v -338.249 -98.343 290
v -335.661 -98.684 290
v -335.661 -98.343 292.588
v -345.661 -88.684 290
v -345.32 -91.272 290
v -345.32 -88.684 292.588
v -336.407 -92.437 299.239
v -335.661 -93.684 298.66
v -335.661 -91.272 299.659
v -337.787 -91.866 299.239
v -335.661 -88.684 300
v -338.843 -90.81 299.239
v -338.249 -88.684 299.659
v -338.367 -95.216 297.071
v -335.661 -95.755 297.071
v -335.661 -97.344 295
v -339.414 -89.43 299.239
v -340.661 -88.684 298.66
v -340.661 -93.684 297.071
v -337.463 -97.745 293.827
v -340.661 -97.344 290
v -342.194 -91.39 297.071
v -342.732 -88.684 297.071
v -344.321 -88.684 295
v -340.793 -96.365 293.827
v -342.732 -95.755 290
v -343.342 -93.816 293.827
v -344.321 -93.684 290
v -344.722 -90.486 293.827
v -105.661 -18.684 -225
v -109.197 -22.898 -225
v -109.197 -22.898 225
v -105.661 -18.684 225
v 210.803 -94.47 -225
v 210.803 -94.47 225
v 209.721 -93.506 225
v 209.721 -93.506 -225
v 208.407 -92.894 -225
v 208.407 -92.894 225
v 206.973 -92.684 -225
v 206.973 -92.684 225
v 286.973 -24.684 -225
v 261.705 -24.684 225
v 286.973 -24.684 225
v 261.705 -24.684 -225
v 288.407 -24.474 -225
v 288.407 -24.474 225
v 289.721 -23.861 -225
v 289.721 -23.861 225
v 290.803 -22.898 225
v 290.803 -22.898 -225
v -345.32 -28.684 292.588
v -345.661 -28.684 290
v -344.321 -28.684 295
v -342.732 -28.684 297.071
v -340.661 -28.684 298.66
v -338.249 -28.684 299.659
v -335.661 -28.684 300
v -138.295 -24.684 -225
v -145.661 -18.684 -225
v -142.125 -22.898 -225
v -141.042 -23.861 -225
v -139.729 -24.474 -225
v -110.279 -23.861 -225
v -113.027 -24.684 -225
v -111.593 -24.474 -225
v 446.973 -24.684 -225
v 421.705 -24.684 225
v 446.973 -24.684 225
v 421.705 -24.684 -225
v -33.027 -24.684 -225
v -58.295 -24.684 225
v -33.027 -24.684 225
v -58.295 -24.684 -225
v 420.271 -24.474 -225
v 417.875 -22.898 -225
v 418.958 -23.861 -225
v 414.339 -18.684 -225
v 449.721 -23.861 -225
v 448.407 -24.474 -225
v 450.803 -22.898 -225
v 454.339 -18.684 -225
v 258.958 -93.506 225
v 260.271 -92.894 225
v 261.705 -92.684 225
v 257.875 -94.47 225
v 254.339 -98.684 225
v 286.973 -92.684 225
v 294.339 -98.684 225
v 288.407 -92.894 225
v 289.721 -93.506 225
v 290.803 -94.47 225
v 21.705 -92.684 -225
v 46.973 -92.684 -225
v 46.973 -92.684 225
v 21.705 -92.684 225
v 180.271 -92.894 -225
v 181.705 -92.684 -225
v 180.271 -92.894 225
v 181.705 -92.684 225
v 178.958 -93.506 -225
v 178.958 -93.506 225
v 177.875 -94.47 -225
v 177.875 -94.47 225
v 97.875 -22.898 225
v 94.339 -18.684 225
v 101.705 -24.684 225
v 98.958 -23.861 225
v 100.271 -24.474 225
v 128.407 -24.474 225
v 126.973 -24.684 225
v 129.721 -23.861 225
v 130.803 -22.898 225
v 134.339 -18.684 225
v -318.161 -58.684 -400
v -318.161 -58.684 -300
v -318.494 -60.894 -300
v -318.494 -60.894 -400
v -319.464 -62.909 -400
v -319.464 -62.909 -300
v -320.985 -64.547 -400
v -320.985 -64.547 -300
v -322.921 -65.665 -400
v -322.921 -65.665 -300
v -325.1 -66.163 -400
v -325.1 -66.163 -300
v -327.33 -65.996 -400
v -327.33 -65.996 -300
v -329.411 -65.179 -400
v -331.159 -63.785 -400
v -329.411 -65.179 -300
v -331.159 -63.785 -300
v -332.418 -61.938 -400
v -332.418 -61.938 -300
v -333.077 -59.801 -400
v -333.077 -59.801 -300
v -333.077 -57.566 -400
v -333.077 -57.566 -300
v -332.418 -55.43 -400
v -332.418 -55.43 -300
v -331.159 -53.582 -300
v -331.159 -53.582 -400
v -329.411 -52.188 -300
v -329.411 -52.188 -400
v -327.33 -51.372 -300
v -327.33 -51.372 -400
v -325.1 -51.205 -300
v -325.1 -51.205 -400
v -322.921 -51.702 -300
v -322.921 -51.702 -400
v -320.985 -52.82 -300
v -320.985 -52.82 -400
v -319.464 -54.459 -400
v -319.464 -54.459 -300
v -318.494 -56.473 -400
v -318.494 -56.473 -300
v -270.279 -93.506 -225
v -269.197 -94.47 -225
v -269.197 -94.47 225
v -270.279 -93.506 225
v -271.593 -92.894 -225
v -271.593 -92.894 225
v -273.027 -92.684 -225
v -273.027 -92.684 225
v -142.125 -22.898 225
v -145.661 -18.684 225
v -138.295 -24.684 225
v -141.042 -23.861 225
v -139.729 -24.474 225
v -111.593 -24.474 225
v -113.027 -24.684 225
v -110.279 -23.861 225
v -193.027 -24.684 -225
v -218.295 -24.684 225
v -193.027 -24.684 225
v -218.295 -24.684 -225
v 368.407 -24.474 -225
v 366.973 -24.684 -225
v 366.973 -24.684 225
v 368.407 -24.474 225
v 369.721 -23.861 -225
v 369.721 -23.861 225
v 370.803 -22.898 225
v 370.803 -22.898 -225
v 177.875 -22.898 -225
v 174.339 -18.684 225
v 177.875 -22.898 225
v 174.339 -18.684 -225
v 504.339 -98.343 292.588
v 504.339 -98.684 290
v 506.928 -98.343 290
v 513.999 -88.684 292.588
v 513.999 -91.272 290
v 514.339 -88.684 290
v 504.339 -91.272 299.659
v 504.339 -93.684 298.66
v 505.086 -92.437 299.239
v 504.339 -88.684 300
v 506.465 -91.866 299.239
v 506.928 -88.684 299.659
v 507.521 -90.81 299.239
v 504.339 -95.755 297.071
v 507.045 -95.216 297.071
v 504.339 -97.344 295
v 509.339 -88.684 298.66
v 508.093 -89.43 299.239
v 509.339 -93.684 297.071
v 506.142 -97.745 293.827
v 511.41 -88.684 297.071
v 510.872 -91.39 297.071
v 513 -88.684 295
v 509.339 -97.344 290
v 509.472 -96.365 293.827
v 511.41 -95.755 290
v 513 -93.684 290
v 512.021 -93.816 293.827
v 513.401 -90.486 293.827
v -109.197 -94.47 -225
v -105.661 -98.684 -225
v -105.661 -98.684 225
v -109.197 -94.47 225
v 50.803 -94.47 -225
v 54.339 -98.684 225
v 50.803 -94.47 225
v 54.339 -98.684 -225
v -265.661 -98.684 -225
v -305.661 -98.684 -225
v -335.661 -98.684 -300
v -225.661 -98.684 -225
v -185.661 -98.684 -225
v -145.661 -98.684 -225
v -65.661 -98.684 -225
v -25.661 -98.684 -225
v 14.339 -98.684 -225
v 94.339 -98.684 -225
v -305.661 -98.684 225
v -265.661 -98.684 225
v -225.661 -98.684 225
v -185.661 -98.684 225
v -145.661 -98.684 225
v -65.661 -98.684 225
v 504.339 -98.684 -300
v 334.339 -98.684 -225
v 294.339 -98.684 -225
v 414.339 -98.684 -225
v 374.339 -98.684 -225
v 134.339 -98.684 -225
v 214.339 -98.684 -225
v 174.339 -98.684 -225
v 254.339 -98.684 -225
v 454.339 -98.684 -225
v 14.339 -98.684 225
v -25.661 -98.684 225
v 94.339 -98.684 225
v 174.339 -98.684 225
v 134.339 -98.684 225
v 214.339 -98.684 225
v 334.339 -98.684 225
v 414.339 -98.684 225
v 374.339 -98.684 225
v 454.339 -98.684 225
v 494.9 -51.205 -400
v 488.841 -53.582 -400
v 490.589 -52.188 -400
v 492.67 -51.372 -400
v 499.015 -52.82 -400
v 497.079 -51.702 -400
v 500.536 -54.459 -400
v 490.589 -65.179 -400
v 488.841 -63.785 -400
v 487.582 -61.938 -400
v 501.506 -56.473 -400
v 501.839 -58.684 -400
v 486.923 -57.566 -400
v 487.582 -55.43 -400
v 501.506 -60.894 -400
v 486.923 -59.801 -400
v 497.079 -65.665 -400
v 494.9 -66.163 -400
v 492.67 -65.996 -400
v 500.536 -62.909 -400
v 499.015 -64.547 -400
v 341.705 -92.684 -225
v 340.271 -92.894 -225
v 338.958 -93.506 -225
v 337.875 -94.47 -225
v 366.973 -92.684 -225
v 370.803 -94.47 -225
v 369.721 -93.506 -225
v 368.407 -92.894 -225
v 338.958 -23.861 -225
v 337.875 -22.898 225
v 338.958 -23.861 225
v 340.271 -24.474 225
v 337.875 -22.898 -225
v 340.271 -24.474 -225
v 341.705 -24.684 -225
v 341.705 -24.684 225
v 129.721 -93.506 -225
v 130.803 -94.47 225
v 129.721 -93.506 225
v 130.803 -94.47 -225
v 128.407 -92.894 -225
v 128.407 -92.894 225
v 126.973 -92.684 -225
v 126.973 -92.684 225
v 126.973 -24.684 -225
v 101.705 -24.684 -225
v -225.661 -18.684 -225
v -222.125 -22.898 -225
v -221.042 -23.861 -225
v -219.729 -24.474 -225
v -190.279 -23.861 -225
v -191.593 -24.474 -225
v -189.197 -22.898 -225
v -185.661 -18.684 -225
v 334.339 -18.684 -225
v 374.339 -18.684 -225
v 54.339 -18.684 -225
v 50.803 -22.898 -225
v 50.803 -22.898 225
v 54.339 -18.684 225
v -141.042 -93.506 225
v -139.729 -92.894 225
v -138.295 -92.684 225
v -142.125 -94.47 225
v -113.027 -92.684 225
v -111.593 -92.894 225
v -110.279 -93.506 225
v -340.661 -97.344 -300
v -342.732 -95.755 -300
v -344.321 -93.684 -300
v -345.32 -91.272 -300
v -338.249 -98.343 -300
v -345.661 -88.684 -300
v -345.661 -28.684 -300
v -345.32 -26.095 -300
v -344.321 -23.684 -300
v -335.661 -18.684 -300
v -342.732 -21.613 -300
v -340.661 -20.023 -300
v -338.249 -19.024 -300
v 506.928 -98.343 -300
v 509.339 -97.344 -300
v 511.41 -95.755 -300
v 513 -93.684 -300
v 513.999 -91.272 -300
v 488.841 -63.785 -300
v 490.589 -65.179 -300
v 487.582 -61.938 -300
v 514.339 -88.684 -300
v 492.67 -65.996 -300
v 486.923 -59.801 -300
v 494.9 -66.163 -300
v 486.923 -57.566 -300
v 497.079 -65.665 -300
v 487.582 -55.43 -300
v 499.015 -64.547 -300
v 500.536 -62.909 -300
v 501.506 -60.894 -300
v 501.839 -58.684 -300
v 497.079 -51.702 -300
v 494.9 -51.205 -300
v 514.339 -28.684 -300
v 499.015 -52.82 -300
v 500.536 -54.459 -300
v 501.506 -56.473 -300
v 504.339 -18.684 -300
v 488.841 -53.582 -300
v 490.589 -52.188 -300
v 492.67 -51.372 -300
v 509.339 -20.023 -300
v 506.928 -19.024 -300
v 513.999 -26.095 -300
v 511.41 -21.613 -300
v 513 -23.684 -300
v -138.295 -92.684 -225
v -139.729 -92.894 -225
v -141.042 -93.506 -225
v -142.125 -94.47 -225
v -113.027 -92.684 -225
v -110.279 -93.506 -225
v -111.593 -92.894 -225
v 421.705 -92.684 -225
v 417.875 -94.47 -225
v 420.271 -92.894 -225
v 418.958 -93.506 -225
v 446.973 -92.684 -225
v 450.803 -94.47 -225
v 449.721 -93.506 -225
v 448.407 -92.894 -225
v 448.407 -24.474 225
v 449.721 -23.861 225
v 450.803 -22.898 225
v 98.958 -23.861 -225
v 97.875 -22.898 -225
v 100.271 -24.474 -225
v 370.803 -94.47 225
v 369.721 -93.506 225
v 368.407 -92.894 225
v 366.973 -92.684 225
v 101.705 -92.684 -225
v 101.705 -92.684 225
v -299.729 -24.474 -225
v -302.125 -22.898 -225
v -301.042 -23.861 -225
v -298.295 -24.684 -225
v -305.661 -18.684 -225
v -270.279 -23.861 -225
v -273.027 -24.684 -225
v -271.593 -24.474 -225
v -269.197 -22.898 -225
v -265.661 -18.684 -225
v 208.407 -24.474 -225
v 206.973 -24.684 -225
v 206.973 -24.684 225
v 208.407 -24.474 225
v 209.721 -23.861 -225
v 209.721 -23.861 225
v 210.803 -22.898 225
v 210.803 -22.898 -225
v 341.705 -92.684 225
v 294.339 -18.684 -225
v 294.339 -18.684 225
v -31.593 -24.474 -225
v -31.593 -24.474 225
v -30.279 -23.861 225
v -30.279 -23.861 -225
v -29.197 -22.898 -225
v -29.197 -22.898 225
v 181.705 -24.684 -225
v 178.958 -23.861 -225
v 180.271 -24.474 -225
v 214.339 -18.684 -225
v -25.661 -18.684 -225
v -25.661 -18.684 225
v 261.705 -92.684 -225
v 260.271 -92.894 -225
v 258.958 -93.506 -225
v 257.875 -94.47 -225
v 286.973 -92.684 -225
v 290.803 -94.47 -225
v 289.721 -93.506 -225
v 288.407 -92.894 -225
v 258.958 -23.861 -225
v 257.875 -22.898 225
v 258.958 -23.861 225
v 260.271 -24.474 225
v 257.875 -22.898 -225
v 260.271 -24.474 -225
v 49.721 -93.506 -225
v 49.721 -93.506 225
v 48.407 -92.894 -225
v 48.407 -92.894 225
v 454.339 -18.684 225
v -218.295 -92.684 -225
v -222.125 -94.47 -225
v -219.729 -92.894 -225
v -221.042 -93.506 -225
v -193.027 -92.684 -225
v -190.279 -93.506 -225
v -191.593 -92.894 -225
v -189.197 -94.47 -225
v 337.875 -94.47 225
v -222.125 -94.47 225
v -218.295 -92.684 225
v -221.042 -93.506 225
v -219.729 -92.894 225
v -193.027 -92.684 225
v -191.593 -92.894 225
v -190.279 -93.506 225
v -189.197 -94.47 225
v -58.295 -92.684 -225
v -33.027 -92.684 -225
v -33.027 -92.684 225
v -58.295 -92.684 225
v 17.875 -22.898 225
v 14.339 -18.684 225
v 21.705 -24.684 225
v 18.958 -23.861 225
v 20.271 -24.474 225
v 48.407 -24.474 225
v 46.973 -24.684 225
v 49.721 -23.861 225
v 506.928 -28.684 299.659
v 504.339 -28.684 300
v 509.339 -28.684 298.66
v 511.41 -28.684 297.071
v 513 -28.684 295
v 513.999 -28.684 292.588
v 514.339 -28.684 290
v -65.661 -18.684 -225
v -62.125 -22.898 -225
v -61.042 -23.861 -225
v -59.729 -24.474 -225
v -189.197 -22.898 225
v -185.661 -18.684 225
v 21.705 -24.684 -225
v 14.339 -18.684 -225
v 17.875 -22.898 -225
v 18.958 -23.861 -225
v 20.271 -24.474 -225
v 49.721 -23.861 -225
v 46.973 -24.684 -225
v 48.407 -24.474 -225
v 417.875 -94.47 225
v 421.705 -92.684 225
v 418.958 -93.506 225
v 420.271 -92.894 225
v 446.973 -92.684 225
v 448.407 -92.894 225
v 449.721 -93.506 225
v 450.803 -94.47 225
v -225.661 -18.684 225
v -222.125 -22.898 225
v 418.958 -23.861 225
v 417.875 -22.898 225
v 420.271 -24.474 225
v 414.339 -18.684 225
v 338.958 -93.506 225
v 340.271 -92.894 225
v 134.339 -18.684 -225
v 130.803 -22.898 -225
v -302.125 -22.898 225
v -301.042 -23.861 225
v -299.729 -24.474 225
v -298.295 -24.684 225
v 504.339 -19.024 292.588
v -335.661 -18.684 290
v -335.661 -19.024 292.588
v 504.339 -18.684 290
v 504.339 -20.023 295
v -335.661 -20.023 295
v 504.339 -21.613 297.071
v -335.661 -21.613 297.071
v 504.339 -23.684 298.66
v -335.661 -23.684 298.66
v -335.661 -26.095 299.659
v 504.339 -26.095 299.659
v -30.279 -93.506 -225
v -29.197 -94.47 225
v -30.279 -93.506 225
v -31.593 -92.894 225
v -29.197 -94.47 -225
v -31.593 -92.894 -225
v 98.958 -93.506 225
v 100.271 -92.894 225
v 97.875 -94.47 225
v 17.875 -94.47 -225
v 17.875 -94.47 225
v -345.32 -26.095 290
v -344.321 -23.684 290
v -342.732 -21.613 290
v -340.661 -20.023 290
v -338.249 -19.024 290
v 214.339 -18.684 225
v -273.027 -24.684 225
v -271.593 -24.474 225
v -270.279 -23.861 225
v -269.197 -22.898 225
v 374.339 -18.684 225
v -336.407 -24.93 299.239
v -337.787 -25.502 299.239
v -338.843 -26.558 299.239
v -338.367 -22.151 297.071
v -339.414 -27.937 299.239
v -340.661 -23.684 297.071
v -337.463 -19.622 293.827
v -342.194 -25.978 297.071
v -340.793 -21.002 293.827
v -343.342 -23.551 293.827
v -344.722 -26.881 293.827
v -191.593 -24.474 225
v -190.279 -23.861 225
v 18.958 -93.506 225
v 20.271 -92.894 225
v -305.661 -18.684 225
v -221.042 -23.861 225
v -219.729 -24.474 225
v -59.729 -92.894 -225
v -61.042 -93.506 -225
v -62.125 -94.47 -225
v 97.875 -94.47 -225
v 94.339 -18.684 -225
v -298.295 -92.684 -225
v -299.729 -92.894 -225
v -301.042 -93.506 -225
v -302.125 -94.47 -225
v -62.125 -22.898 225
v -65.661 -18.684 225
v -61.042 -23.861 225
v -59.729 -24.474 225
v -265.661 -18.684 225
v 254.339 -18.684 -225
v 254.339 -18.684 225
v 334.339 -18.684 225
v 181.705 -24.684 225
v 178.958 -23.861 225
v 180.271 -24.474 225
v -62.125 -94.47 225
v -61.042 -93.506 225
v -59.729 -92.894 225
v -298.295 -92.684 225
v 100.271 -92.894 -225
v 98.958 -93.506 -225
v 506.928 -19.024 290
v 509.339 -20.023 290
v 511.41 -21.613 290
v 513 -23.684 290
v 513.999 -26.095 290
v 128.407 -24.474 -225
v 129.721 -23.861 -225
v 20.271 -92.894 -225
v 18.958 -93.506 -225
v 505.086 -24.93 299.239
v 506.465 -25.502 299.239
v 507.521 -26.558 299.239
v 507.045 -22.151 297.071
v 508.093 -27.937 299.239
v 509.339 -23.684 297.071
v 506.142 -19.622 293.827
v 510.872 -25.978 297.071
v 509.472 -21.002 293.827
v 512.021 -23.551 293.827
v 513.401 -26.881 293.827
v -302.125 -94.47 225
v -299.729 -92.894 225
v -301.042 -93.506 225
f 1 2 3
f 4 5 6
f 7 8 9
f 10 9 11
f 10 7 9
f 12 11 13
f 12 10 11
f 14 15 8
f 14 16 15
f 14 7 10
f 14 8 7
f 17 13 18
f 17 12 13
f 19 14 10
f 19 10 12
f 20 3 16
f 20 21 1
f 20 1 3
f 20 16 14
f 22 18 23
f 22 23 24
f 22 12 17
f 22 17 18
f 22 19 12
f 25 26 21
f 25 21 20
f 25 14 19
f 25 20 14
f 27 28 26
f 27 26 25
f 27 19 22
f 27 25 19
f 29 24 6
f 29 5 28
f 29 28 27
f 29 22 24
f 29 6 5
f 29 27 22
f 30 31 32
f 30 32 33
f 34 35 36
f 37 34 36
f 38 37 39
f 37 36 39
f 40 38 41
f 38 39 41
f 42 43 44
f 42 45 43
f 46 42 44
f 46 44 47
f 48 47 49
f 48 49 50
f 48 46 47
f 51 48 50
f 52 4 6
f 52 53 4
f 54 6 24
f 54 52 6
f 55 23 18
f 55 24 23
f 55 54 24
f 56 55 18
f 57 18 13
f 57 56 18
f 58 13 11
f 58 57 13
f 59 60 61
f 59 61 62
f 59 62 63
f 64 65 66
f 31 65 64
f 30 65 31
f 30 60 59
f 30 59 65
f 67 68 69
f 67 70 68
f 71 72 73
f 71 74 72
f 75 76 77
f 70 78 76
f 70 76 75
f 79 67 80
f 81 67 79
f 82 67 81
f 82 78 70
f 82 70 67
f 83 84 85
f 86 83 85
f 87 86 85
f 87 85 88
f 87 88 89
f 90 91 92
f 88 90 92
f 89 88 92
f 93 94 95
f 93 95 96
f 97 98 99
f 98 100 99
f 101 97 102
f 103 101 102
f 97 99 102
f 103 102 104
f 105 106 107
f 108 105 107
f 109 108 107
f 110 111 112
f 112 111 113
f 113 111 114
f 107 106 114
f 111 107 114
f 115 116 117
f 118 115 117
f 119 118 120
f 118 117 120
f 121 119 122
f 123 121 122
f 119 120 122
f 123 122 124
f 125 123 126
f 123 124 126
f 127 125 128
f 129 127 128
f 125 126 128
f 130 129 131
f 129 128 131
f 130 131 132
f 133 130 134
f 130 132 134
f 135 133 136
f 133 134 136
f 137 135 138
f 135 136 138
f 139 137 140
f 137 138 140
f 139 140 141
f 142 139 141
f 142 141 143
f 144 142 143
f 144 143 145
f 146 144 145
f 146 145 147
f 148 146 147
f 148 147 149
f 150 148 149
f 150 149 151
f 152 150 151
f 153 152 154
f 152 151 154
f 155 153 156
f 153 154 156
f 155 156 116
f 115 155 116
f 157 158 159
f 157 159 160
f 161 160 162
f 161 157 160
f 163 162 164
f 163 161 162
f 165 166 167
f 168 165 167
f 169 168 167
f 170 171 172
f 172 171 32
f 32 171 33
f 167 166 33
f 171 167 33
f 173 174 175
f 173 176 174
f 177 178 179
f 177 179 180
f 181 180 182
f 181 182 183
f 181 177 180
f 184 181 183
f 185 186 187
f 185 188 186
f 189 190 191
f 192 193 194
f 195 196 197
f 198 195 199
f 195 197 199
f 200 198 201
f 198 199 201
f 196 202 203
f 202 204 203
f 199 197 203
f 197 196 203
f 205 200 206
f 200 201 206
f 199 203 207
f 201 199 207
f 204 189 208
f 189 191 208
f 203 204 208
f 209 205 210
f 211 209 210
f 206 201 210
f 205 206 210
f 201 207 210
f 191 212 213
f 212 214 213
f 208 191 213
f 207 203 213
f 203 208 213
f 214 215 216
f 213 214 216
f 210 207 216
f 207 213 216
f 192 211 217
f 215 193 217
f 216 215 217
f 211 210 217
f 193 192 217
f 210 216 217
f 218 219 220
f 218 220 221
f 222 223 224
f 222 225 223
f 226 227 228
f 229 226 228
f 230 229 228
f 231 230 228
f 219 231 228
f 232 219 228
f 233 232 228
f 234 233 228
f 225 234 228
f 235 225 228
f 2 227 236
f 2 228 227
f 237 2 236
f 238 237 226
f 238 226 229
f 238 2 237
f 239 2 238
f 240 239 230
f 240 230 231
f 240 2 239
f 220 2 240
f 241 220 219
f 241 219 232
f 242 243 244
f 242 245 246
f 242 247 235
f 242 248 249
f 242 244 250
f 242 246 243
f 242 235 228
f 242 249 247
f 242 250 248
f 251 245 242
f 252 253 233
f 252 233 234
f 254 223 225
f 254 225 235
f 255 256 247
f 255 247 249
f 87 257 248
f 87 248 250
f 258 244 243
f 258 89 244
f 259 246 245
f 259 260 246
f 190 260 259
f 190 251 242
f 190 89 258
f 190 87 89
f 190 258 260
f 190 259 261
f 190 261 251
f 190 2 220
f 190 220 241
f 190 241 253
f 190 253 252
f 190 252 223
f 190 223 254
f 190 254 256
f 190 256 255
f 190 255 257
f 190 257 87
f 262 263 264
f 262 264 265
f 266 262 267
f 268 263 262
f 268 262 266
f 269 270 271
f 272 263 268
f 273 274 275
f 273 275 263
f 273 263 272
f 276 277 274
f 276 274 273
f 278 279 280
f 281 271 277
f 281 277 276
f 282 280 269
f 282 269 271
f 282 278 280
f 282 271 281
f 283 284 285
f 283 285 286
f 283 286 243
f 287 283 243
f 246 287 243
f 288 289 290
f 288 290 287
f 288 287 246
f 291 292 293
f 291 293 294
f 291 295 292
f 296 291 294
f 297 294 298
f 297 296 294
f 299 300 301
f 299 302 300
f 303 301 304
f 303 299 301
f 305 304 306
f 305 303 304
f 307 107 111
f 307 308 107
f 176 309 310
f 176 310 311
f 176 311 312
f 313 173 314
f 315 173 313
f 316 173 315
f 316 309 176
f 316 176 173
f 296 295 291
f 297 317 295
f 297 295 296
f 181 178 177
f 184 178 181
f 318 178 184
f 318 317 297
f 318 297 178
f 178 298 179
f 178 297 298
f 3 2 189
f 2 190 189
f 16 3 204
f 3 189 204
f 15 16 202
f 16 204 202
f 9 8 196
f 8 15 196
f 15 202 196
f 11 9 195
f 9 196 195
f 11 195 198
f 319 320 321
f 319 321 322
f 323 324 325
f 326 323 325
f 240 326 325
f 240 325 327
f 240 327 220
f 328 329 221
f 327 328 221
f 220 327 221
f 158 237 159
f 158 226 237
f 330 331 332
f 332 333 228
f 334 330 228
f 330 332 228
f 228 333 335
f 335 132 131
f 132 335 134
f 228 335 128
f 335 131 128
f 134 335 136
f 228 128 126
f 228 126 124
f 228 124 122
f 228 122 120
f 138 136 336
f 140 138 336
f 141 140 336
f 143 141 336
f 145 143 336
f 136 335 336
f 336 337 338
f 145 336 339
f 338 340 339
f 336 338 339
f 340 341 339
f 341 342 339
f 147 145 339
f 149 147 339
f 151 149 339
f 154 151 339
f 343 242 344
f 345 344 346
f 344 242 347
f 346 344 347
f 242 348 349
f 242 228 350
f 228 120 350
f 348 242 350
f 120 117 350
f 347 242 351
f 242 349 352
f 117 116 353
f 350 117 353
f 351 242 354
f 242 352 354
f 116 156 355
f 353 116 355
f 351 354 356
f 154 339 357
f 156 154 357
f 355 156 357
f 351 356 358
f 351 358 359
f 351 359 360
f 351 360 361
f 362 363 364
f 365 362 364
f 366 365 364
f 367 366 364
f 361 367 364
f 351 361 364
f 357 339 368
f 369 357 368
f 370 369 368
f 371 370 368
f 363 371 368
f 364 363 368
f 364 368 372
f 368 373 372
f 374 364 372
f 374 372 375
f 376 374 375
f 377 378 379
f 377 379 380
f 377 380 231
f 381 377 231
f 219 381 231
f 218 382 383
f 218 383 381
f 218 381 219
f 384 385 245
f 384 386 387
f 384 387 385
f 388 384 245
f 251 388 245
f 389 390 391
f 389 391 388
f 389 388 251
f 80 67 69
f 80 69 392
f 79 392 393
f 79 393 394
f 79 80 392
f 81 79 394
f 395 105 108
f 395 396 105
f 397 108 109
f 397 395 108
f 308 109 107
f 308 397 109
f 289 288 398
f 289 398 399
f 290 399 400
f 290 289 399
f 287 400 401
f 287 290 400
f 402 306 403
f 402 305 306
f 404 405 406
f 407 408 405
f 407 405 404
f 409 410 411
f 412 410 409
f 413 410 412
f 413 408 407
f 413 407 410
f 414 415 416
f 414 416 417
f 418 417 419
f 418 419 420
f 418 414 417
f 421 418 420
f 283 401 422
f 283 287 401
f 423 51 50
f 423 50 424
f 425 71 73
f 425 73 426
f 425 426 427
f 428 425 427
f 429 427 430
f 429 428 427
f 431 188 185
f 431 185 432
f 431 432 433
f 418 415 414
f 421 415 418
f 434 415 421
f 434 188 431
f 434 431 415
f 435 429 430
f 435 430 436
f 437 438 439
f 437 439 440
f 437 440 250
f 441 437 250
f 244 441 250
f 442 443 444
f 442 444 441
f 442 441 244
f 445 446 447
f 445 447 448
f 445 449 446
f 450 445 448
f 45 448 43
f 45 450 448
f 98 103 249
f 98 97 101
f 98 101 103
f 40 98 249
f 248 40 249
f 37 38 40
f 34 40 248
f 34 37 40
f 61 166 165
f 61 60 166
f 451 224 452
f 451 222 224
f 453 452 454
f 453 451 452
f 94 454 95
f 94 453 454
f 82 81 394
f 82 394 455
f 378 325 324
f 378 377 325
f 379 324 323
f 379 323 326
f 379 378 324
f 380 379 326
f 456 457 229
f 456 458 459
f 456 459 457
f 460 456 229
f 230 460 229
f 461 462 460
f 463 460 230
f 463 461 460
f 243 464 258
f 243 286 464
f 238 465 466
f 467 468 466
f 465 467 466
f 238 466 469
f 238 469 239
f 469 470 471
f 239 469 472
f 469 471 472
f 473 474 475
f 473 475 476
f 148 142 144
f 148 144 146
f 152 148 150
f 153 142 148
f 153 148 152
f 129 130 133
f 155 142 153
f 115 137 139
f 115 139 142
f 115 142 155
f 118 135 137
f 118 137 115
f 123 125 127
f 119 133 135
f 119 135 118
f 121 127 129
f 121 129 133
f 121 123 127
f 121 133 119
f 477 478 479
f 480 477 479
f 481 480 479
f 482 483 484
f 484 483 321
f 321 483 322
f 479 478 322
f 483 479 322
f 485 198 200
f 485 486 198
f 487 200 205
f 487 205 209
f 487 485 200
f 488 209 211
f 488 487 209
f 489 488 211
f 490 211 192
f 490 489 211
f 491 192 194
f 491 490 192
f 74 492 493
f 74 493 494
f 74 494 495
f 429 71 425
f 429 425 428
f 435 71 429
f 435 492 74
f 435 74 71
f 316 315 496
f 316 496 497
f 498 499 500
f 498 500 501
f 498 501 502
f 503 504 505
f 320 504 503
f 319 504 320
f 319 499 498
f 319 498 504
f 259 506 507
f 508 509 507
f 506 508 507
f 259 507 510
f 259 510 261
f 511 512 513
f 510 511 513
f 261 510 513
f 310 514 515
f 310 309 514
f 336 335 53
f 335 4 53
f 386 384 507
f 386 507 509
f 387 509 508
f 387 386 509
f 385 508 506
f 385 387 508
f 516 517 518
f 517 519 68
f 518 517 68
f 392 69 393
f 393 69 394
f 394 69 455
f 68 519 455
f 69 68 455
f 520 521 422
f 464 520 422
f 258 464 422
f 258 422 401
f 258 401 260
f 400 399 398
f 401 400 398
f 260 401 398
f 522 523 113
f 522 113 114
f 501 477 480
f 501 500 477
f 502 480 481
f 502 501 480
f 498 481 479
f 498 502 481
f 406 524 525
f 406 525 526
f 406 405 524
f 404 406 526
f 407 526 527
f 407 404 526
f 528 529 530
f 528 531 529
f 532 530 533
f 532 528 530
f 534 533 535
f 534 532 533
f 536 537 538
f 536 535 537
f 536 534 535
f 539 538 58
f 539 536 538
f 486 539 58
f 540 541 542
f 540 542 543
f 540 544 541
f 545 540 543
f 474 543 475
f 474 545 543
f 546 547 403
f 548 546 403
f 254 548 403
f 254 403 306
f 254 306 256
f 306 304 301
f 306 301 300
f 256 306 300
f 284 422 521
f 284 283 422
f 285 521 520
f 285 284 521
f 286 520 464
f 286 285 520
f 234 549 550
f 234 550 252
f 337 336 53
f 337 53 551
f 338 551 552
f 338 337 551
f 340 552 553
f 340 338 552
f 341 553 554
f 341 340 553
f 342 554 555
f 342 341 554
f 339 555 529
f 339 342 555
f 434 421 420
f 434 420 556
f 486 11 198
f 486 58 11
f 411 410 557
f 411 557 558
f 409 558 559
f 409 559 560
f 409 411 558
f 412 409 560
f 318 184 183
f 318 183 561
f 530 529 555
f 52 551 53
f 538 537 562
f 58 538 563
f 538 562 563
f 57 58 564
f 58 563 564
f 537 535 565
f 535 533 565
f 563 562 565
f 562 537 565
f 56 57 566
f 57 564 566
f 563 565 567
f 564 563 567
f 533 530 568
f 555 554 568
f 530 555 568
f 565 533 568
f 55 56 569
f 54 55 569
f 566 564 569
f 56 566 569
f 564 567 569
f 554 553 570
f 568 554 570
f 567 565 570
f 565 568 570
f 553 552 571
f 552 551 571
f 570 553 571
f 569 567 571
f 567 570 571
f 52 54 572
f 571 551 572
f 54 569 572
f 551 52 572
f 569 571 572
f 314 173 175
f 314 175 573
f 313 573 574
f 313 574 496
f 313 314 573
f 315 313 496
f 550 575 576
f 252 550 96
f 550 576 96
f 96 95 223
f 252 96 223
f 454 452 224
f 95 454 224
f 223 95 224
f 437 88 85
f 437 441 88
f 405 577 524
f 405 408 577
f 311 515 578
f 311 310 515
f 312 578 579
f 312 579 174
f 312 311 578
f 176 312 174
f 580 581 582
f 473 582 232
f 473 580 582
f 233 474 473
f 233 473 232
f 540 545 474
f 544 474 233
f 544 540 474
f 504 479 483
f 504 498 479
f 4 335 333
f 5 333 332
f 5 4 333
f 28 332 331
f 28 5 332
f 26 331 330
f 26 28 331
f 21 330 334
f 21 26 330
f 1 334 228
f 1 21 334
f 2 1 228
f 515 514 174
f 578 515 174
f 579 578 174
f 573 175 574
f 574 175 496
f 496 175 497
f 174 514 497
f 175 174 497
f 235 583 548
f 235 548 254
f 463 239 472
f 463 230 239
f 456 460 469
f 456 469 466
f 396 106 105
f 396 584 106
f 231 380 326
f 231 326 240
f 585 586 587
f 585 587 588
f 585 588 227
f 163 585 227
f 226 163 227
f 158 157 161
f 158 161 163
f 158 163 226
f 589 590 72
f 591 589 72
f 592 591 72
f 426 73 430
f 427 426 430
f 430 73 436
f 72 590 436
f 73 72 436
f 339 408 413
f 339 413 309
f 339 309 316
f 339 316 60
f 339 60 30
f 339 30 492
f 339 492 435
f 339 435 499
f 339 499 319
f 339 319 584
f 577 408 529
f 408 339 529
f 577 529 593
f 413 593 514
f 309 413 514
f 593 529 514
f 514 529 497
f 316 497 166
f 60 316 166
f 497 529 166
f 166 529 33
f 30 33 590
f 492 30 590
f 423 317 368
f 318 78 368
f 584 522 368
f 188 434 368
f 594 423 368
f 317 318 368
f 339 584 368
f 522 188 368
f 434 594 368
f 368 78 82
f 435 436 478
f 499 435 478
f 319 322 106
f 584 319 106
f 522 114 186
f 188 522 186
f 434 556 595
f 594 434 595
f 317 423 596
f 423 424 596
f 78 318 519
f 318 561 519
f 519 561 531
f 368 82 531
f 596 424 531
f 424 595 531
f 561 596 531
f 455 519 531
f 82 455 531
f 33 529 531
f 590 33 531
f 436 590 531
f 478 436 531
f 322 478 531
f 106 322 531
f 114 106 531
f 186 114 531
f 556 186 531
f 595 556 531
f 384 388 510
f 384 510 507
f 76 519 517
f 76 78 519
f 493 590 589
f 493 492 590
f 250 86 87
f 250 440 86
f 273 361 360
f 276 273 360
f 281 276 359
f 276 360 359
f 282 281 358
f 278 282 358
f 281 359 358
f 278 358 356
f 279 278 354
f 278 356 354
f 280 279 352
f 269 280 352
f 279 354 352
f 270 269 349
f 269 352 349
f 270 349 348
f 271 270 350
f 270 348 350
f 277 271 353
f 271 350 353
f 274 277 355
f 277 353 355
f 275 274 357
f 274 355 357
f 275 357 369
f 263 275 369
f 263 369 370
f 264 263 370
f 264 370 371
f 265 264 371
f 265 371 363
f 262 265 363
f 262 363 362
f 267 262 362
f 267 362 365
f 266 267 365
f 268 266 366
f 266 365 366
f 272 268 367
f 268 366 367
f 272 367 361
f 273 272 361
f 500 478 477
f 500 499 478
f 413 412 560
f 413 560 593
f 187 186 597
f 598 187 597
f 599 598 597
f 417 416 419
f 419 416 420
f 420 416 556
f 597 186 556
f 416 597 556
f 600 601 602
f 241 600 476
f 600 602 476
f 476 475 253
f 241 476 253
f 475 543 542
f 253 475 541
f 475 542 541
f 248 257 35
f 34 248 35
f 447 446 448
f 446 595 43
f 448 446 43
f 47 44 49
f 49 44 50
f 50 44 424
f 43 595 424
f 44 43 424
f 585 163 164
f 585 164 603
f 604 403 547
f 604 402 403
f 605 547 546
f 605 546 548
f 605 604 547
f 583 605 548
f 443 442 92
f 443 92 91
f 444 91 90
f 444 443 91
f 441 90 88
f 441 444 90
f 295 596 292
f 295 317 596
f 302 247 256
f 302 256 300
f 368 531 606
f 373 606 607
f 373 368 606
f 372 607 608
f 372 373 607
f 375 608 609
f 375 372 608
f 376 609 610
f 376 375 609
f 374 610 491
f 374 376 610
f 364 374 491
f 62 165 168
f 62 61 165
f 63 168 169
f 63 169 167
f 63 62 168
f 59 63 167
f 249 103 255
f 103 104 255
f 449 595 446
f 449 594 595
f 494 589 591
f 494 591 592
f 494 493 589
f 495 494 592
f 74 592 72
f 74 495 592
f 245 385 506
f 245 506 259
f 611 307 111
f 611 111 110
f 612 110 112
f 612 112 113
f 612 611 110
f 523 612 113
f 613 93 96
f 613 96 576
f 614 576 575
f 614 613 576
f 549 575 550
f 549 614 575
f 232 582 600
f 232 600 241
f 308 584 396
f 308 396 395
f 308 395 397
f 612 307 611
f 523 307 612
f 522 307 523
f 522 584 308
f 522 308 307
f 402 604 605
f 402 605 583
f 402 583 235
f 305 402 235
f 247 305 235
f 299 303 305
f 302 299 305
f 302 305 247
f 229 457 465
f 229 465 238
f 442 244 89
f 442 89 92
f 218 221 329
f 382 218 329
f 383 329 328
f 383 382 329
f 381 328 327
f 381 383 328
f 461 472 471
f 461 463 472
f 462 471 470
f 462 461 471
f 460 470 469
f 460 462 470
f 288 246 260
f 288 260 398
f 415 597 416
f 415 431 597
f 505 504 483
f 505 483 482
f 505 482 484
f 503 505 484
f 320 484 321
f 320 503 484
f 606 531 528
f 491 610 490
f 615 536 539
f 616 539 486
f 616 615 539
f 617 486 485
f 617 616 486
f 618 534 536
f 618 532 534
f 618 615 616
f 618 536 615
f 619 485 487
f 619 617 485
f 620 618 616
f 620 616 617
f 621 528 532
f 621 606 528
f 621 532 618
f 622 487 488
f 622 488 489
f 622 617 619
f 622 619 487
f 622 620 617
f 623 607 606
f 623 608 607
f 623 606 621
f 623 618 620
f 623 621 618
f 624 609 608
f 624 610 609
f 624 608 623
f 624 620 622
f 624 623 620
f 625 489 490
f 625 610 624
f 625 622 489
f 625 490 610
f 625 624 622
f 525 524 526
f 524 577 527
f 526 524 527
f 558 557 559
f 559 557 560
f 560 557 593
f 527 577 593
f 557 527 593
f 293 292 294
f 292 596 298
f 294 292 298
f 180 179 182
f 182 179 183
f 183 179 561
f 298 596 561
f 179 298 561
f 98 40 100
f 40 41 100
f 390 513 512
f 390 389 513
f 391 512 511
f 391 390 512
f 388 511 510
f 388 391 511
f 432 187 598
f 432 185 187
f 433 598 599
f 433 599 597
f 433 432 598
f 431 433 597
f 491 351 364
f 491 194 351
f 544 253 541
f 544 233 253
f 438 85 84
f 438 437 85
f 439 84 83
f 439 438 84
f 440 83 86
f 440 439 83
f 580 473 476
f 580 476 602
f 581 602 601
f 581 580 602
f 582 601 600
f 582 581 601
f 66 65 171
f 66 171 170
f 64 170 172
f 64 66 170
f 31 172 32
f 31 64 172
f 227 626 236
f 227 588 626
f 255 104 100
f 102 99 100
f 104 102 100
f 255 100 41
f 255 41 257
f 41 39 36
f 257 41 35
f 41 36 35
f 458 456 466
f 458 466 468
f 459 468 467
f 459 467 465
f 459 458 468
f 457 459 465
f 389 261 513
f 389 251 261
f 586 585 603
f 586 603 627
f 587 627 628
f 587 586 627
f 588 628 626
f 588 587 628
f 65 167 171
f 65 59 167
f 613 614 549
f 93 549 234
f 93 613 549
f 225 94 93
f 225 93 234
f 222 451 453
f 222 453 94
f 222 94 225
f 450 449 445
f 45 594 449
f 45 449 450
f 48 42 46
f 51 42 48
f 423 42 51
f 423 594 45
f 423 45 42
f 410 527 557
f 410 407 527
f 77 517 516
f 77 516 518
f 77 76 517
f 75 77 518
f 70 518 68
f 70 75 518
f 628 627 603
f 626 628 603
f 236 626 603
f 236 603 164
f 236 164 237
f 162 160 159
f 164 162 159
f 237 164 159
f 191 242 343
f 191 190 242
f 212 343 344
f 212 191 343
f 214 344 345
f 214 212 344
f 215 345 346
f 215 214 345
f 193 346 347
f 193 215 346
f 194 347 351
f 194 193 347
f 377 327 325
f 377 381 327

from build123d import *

# Parameters (mm, degrees)
F0_W     = 860
F0_H     = 80
F1_DEPTH = 300
F2_R     = 7.5
F3_DEPTH = 100
F5_DEPTH = 225
F6_R     = 10


with BuildPart() as f1:
    # F0 (on Top) → F1 (new body, symmetric)
    with BuildSketch(Plane.XY):
        with Locations((84.33931, -58.683639)):
            Rectangle(F0_W, F0_H)
    extrude(amount=F1_DEPTH, both=True)

    # F2 (on face) → F3 (join)
    with BuildSketch(Plane(origin=(0, 0, -300), x_dir=(1, 0, 0), z_dir=(0, 0, -1))):
        with Locations((494.33931, 58.683639)):
            Circle(F2_R)
        with Locations((-325.66069, 58.683639)):
            Circle(F2_R)
    extrude(amount=F3_DEPTH)

    # F4 (on Top) → F5 (cut, symmetric)
    with BuildSketch(Plane.XY):
        with BuildLine():
            Line((-265.66069, -18.683639), (-305.66069, -18.683639))
            Line((-305.66069, -18.683639), (-302.124776, -22.897577))
            ThreePointArc((-302.124776, -22.897577), (-300.407645, -24.215178), (-298.294554, -24.683639))
            Line((-298.294554, -24.683639), (-273.026826, -24.683639))
            ThreePointArc((-273.026826, -24.683639), (-270.913735, -24.215178), (-269.196604, -22.897577))
            Line((-269.196604, -22.897577), (-265.66069, -18.683639))
        make_face()
        with BuildLine():
            Line((-185.66069, -18.683639), (-225.66069, -18.683639))
            Line((-225.66069, -18.683639), (-222.124776, -22.897577))
            ThreePointArc((-222.124776, -22.897577), (-220.407645, -24.215178), (-218.294554, -24.683639))
            Line((-218.294554, -24.683639), (-193.026826, -24.683639))
            ThreePointArc((-193.026826, -24.683639), (-190.913735, -24.215178), (-189.196604, -22.897577))
            Line((-189.196604, -22.897577), (-185.66069, -18.683639))
        make_face()
        with BuildLine():
            Line((-105.66069, -18.683639), (-145.66069, -18.683639))
            Line((-145.66069, -18.683639), (-142.124776, -22.897577))
            ThreePointArc((-142.124776, -22.897577), (-140.407645, -24.215178), (-138.294554, -24.683639))
            Line((-138.294554, -24.683639), (-113.026826, -24.683639))
            ThreePointArc((-113.026826, -24.683639), (-110.913735, -24.215178), (-109.196604, -22.897577))
            Line((-109.196604, -22.897577), (-105.66069, -18.683639))
        make_face()
        with BuildLine():
            Line((-25.66069, -18.683639), (-65.66069, -18.683639))
            Line((-65.66069, -18.683639), (-62.124776, -22.897577))
            ThreePointArc((-62.124776, -22.897577), (-60.407645, -24.215178), (-58.294554, -24.683639))
            Line((-58.294554, -24.683639), (-33.026826, -24.683639))
            ThreePointArc((-33.026826, -24.683639), (-30.913735, -24.215178), (-29.196604, -22.897577))
            Line((-29.196604, -22.897577), (-25.66069, -18.683639))
        make_face()
        with BuildLine():
            Line((54.33931, -18.683639), (14.33931, -18.683639))
            Line((14.33931, -18.683639), (17.875224, -22.897577))
            ThreePointArc((17.875224, -22.897577), (19.592355, -24.215178), (21.705446, -24.683639))
            Line((21.705446, -24.683639), (46.973174, -24.683639))
            ThreePointArc((46.973174, -24.683639), (49.086265, -24.215178), (50.803396, -22.897577))
            Line((50.803396, -22.897577), (54.33931, -18.683639))
        make_face()
        with BuildLine():
            Line((134.33931, -18.683639), (94.33931, -18.683639))
            Line((94.33931, -18.683639), (97.875224, -22.897577))
            ThreePointArc((97.875224, -22.897577), (99.592355, -24.215178), (101.705446, -24.683639))
            Line((101.705446, -24.683639), (126.973174, -24.683639))
            ThreePointArc((126.973174, -24.683639), (129.086265, -24.215178), (130.803396, -22.897577))
            Line((130.803396, -22.897577), (134.33931, -18.683639))
        make_face()
        with BuildLine():
            Line((214.33931, -18.683639), (174.33931, -18.683639))
            Line((174.33931, -18.683639), (177.875224, -22.897577))
            ThreePointArc((177.875224, -22.897577), (179.592355, -24.215178), (181.705446, -24.683639))
            Line((181.705446, -24.683639), (206.973174, -24.683639))
            ThreePointArc((206.973174, -24.683639), (209.086265, -24.215178), (210.803396, -22.897577))
            Line((210.803396, -22.897577), (214.33931, -18.683639))
        make_face()
        with BuildLine():
            Line((294.33931, -18.683639), (254.33931, -18.683639))
            Line((254.33931, -18.683639), (257.875224, -22.897577))
            ThreePointArc((257.875224, -22.897577), (259.592355, -24.215178), (261.705446, -24.683639))
            Line((261.705446, -24.683639), (286.973174, -24.683639))
            ThreePointArc((286.973174, -24.683639), (289.086265, -24.215178), (290.803396, -22.897577))
            Line((290.803396, -22.897577), (294.33931, -18.683639))
        make_face()
        with BuildLine():
            Line((374.33931, -18.683639), (334.33931, -18.683639))
            Line((334.33931, -18.683639), (337.875224, -22.897577))
            ThreePointArc((337.875224, -22.897577), (339.592355, -24.215178), (341.705446, -24.683639))
            Line((341.705446, -24.683639), (366.973174, -24.683639))
            ThreePointArc((366.973174, -24.683639), (369.086265, -24.215178), (370.803396, -22.897577))
            Line((370.803396, -22.897577), (374.33931, -18.683639))
        make_face()
        with BuildLine():
            Line((454.33931, -18.683639), (414.33931, -18.683639))
            Line((414.33931, -18.683639), (417.875224, -22.897577))
            ThreePointArc((417.875224, -22.897577), (419.592355, -24.215178), (421.705446, -24.683639))
            Line((421.705446, -24.683639), (446.973174, -24.683639))
            ThreePointArc((446.973174, -24.683639), (449.086265, -24.215178), (450.803396, -22.897577))
            Line((450.803396, -22.897577), (454.33931, -18.683639))
        make_face()
        with BuildLine():
            ThreePointArc((-298.294554, -92.683639), (-300.407645, -93.1521), (-302.124776, -94.469701))
            Line((-302.124776, -94.469701), (-305.66069, -98.683639))
            Line((-305.66069, -98.683639), (-265.66069, -98.683639))
            Line((-265.66069, -98.683639), (-269.196604, -94.469701))
            ThreePointArc((-269.196604, -94.469701), (-270.913735, -93.1521), (-273.026826, -92.683639))
            Line((-273.026826, -92.683639), (-298.294554, -92.683639))
        make_face()
        with BuildLine():
            Line((-222.124776, -94.469701), (-225.66069, -98.683639))
            Line((-225.66069, -98.683639), (-185.66069, -98.683639))
            Line((-185.66069, -98.683639), (-189.196604, -94.469701))
            ThreePointArc((-189.196604, -94.469701), (-190.913735, -93.1521), (-193.026826, -92.683639))
            Line((-193.026826, -92.683639), (-218.294554, -92.683639))
            ThreePointArc((-218.294554, -92.683639), (-220.407645, -93.1521), (-222.124776, -94.469701))
        make_face()
        with BuildLine():
            ThreePointArc((290.803396, -94.469701), (289.086265, -93.1521), (286.973174, -92.683639))
            Line((286.973174, -92.683639), (261.705446, -92.683639))
            ThreePointArc((261.705446, -92.683639), (259.592355, -93.1521), (257.875224, -94.469701))
            Line((257.875224, -94.469701), (254.33931, -98.683639))
            Line((254.33931, -98.683639), (294.33931, -98.683639))
            Line((294.33931, -98.683639), (290.803396, -94.469701))
        make_face()
        with BuildLine():
            Line((-62.124776, -94.469701), (-65.66069, -98.683639))
            Line((-65.66069, -98.683639), (-25.66069, -98.683639))
            Line((-25.66069, -98.683639), (-29.196604, -94.469701))
            ThreePointArc((-29.196604, -94.469701), (-30.913735, -93.1521), (-33.026826, -92.683639))
            Line((-33.026826, -92.683639), (-58.294554, -92.683639))
            ThreePointArc((-58.294554, -92.683639), (-60.407645, -93.1521), (-62.124776, -94.469701))
        make_face()
        with BuildLine():
            Line((-105.66069, -98.683639), (-109.196604, -94.469701))
            ThreePointArc((-109.196604, -94.469701), (-110.913735, -93.1521), (-113.026826, -92.683639))
            Line((-113.026826, -92.683639), (-138.294554, -92.683639))
            ThreePointArc((-138.294554, -92.683639), (-140.407645, -93.1521), (-142.124776, -94.469701))
            Line((-142.124776, -94.469701), (-145.66069, -98.683639))
            Line((-145.66069, -98.683639), (-105.66069, -98.683639))
        make_face()
        with BuildLine():
            Line((417.875224, -94.469701), (414.33931, -98.683639))
            Line((414.33931, -98.683639), (454.33931, -98.683639))
            Line((454.33931, -98.683639), (450.803396, -94.469701))
            ThreePointArc((450.803396, -94.469701), (449.086265, -93.1521), (446.973174, -92.683639))
            Line((446.973174, -92.683639), (421.705446, -92.683639))
            ThreePointArc((421.705446, -92.683639), (419.592355, -93.1521), (417.875224, -94.469701))
        make_face()
        with BuildLine():
            Line((17.875224, -94.469701), (14.33931, -98.683639))
            Line((14.33931, -98.683639), (54.33931, -98.683639))
            Line((54.33931, -98.683639), (50.803396, -94.469701))
            ThreePointArc((50.803396, -94.469701), (49.086265, -93.1521), (46.973174, -92.683639))
            Line((46.973174, -92.683639), (21.705446, -92.683639))
            ThreePointArc((21.705446, -92.683639), (19.592355, -93.1521), (17.875224, -94.469701))
        make_face()
        with BuildLine():
            Line((134.33931, -98.683639), (130.803396, -94.469701))
            ThreePointArc((130.803396, -94.469701), (129.086265, -93.1521), (126.973174, -92.683639))
            Line((126.973174, -92.683639), (101.705446, -92.683639))
            ThreePointArc((101.705446, -92.683639), (99.592355, -93.1521), (97.875224, -94.469701))
            Line((97.875224, -94.469701), (94.33931, -98.683639))
            Line((94.33931, -98.683639), (134.33931, -98.683639))
        make_face()
        with BuildLine():
            ThreePointArc((370.803396, -94.469701), (369.086265, -93.1521), (366.973174, -92.683639))
            Line((366.973174, -92.683639), (341.705446, -92.683639))
            ThreePointArc((341.705446, -92.683639), (339.592355, -93.1521), (337.875224, -94.469701))
            Line((337.875224, -94.469701), (334.33931, -98.683639))
            Line((334.33931, -98.683639), (374.33931, -98.683639))
            Line((374.33931, -98.683639), (370.803396, -94.469701))
        make_face()
        with BuildLine():
            Line((177.875224, -94.469701), (174.33931, -98.683639))
            Line((174.33931, -98.683639), (214.33931, -98.683639))
            Line((214.33931, -98.683639), (210.803396, -94.469701))
            ThreePointArc((210.803396, -94.469701), (209.086265, -93.1521), (206.973174, -92.683639))
            Line((206.973174, -92.683639), (181.705446, -92.683639))
            ThreePointArc((181.705446, -92.683639), (179.592355, -93.1521), (177.875224, -94.469701))
        make_face()
    extrude(amount=F5_DEPTH, both=True, mode=Mode.SUBTRACT)

    # F6
    f6_edges = [f1.edges().sort_by_distance(p)[0] for p in [
        (-345.66069, -98.683639, 0),
        (-345.66069, -18.683639, 0),
        (514.33931, -98.683639, 0),
        (514.33931, -18.683639, 0),
        (84.33931, -98.683639, 300),
        (84.33931, -18.683639, 300),
        (514.33931, -58.683639, 300),
        (-345.66069, -58.683639, 300),
    ]]
    fillet(f6_edges, radius=F6_R)


solid = f1.part
